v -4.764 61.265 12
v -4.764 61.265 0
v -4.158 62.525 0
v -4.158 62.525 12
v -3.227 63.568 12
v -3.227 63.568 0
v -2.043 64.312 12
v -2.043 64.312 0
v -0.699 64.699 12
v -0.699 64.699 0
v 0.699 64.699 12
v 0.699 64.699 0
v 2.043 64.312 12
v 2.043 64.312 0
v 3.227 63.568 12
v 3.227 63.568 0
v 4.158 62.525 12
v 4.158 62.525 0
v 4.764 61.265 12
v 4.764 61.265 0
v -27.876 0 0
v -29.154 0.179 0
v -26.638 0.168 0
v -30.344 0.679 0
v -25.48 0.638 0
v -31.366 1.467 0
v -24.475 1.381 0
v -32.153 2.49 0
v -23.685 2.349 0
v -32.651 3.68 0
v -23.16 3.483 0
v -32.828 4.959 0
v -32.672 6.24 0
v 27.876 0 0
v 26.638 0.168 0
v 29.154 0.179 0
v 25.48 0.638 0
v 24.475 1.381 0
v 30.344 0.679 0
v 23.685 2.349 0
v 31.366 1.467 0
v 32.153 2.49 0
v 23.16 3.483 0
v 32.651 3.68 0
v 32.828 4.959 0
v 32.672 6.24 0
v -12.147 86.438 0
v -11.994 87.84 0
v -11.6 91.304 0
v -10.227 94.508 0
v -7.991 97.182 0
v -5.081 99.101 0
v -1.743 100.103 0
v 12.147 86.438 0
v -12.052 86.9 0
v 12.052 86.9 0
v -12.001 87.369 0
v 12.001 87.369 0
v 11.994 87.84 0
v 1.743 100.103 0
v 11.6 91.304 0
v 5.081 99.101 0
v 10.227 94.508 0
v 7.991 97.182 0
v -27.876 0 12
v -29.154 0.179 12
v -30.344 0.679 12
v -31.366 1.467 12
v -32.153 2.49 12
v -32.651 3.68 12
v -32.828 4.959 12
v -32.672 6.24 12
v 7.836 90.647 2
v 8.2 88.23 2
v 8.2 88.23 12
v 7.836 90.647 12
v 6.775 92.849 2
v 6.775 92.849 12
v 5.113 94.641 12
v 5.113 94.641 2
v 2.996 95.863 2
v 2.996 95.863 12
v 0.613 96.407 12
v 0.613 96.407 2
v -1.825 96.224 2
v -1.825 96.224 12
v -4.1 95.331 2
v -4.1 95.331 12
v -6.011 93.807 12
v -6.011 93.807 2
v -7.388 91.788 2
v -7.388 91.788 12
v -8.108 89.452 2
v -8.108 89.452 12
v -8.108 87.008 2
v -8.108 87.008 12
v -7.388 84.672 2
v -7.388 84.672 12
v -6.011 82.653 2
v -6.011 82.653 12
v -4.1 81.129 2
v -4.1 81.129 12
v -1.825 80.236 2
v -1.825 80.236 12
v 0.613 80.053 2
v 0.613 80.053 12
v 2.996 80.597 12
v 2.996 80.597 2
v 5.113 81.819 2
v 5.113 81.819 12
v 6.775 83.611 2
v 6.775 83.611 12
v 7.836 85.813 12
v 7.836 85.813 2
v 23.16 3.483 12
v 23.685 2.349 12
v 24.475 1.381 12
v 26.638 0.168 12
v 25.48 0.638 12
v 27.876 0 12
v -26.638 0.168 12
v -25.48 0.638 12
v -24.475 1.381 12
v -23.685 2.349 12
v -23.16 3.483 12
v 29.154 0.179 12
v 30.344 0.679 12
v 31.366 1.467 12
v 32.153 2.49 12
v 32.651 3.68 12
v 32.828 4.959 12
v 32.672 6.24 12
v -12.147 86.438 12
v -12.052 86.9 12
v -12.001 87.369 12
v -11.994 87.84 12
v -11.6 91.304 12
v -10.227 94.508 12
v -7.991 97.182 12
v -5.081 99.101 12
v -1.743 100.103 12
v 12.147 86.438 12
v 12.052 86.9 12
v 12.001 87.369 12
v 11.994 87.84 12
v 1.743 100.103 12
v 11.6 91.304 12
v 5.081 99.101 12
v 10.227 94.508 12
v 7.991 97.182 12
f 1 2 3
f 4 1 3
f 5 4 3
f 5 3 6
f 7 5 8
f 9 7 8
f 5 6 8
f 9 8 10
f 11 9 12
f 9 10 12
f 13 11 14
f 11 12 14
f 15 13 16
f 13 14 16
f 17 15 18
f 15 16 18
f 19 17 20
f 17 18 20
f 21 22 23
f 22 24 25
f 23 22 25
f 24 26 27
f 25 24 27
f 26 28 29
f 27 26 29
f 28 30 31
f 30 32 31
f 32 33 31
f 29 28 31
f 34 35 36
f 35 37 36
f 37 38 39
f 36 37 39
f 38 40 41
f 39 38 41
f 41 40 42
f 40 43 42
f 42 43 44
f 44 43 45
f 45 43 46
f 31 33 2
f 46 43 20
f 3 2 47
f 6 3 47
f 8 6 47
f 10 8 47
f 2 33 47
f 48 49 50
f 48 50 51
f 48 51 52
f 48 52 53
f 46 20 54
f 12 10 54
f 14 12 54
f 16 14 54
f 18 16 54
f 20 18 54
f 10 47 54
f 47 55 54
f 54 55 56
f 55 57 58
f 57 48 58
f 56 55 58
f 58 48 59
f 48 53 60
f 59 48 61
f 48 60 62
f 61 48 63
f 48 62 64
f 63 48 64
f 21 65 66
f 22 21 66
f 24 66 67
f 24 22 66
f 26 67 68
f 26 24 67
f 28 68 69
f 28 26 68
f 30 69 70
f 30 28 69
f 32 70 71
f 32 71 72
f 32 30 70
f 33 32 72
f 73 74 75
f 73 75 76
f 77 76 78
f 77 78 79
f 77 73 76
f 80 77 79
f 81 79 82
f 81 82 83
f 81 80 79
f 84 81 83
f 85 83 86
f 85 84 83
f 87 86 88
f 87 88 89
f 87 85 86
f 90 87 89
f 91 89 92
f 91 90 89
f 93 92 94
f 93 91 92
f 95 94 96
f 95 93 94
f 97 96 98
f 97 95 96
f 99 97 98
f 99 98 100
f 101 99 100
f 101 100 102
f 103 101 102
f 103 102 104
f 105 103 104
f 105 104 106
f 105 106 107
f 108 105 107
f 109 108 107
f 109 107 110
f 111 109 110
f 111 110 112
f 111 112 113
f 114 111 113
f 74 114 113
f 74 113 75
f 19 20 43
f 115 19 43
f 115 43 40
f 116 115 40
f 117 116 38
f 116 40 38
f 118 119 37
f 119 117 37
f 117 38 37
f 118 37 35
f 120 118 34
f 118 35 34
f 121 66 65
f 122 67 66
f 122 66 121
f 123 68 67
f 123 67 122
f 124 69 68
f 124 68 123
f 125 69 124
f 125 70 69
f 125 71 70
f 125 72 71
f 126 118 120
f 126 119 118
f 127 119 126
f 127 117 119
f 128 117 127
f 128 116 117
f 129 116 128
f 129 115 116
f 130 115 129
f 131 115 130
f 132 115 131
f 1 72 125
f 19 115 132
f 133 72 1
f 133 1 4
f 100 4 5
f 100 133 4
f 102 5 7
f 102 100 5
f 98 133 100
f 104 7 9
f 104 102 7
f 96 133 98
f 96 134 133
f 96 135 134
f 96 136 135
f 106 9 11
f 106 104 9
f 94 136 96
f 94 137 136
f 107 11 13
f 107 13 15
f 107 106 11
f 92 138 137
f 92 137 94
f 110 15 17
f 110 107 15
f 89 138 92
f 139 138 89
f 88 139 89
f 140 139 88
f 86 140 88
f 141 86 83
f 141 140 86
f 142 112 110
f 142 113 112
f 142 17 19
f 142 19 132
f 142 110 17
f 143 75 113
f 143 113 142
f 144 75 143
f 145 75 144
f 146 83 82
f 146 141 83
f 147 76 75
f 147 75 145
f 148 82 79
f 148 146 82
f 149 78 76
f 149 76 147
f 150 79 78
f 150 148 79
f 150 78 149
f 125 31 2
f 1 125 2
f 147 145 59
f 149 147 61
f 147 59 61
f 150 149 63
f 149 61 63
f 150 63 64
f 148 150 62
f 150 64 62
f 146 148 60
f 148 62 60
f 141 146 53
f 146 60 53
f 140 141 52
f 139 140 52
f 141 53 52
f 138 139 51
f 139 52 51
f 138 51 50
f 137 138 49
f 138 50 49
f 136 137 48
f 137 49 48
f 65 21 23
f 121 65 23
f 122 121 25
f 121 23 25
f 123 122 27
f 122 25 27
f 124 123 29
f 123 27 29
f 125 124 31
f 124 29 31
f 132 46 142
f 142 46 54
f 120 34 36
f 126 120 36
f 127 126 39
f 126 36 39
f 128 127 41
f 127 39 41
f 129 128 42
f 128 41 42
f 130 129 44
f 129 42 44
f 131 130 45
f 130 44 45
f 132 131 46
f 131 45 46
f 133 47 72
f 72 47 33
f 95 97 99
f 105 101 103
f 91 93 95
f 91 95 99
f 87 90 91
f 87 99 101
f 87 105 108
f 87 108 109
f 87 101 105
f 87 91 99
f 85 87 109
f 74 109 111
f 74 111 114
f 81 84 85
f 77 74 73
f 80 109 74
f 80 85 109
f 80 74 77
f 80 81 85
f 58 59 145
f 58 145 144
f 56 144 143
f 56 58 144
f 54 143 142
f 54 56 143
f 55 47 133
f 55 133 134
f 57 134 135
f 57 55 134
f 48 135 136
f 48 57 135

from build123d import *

# Parameters (mm, degrees)
F0_R        = 8.2
F1_DEPTH    = 12
F2_DEPTH    = 2
F3_T1_DEPTH = 12
F3_T3_DEPTH = 30.2772195225
F3_T5_DEPTH = 44.2039362688


# Not quite as in the source:
# - a fillet or chamfer that OpenCascade refuses, or shapes differently, is made with other operations: its cross-section is extruded or revolved along the edge and cut away or added


with BuildPart() as f1:
    # F0 (on Top) → F1 (new body)
    with BuildSketch(Plane.XY):
        with BuildLine():
            Line((34.2691161265, 0), (11.9548385252, 87.1898676173))
            ThreePointArc((11.9548385252, 87.1898676173), (0, 100.2299809946), (-11.9548385252, 87.1898676173))
            Line((-11.9548385252, 87.1898676173), (-34.2691161265, 0))
            Line((-34.2691161265, 0), (-24.2691161265, 0))
            Line((-24.2691161265, 0), (0, 76.2299809946))
            Line((0, 76.2299809946), (24.2691161265, 0))
            Line((24.2691161265, 0), (34.2691161265, 0))
        make_face()
        with Locations((0, 88.2299809946)):
            Circle(F0_R, mode=Mode.SUBTRACT)
    extrude(amount=F1_DEPTH)

    # F0 (on Top) → F2 (join)
    with BuildSketch(Plane.XY):
        with Locations((0, 88.2299809946)):
            Circle(F0_R)
    extrude(amount=F2_DEPTH)

    # F3: fillet of radius 5 on 7 edges, made by hand

    # F3_s2 → F3_t1 (join)
    with BuildSketch(Plane.XY):
        with BuildLine():
            ThreePointArc((-4.7643738122, 61.2649479353), (0, 64.7481281774), (4.7643738122, 61.2649479353))
            Line((4.7643738122, 61.2649479353), (0, 76.2299809946))
            Line((0, 76.2299809946), (-4.7643738122, 61.2649479353))
        make_face()
        with BuildLine():
            ThreePointArc((11.9936747891, 87.8404106503), (12.0207340622, 87.1339702047), (12.1471577503, 86.4384075845))
            Line((12.1471577503, 86.4384075845), (11.9548385252, 87.1898676173))
            ThreePointArc((11.9548385252, 87.1898676173), (11.9786737183, 87.5148754431), (11.9936747891, 87.8404106503))
        make_face()
        with BuildLine():
            ThreePointArc((-12.1471577503, 86.4384075845), (-12.0207340622, 87.1339702047), (-11.9936747891, 87.8404106503))
            ThreePointArc((-11.9936747891, 87.8404106503), (-11.9786737183, 87.5148754431), (-11.9548385252, 87.1898676173))
            Line((-11.9548385252, 87.1898676173), (-12.1471577503, 86.4384075845))
        make_face()
    extrude(amount=F3_T1_DEPTH)

    # F3_s4 → F3_t3 (cut)
    with BuildSketch(Plane.XY.offset(-9.1386097613)):
        with BuildLine():
            ThreePointArc((-27.924560031, 0), (-24.9736363442, 0.96365891), (-23.1601862189, 3.4831802421))
            Line((-23.1601862189, 3.4831802421), (-24.2691161265, 0))
            Line((-24.2691161265, 0), (-27.924560031, 0))
        make_face()
        with BuildLine():
            ThreePointArc((23.1601862189, 3.4831802421), (24.9736363442, 0.96365891), (27.924560031, 0))
            Line((27.924560031, 0), (24.2691161265, 0))
            Line((24.2691161265, 0), (23.1601862189, 3.4831802421))
        make_face()
    extrude(amount=F3_T3_DEPTH, mode=Mode.SUBTRACT)

    # F3_s6 → F3_t5 (cut)
    with BuildSketch(Plane.XY.offset(-16.1019681344)):
        with BuildLine():
            ThreePointArc((-27.8283288728, 0), (-31.7779117903, 1.9339284455), (-32.6722104071, 6.239682089))
            Line((-32.6722104071, 6.239682089), (-34.2691161265, 0))
            Line((-34.2691161265, 0), (-27.8283288728, 0))
        make_face()
        with BuildLine():
            ThreePointArc((27.8283288728, 0), (31.7779117903, 1.9339284455), (32.6722104071, 6.239682089))
            Line((32.6722104071, 6.239682089), (34.2691161265, 0))
            Line((34.2691161265, 0), (27.8283288728, 0))
        make_face()
    extrude(amount=F3_T5_DEPTH, mode=Mode.SUBTRACT)


solid = f1.part
